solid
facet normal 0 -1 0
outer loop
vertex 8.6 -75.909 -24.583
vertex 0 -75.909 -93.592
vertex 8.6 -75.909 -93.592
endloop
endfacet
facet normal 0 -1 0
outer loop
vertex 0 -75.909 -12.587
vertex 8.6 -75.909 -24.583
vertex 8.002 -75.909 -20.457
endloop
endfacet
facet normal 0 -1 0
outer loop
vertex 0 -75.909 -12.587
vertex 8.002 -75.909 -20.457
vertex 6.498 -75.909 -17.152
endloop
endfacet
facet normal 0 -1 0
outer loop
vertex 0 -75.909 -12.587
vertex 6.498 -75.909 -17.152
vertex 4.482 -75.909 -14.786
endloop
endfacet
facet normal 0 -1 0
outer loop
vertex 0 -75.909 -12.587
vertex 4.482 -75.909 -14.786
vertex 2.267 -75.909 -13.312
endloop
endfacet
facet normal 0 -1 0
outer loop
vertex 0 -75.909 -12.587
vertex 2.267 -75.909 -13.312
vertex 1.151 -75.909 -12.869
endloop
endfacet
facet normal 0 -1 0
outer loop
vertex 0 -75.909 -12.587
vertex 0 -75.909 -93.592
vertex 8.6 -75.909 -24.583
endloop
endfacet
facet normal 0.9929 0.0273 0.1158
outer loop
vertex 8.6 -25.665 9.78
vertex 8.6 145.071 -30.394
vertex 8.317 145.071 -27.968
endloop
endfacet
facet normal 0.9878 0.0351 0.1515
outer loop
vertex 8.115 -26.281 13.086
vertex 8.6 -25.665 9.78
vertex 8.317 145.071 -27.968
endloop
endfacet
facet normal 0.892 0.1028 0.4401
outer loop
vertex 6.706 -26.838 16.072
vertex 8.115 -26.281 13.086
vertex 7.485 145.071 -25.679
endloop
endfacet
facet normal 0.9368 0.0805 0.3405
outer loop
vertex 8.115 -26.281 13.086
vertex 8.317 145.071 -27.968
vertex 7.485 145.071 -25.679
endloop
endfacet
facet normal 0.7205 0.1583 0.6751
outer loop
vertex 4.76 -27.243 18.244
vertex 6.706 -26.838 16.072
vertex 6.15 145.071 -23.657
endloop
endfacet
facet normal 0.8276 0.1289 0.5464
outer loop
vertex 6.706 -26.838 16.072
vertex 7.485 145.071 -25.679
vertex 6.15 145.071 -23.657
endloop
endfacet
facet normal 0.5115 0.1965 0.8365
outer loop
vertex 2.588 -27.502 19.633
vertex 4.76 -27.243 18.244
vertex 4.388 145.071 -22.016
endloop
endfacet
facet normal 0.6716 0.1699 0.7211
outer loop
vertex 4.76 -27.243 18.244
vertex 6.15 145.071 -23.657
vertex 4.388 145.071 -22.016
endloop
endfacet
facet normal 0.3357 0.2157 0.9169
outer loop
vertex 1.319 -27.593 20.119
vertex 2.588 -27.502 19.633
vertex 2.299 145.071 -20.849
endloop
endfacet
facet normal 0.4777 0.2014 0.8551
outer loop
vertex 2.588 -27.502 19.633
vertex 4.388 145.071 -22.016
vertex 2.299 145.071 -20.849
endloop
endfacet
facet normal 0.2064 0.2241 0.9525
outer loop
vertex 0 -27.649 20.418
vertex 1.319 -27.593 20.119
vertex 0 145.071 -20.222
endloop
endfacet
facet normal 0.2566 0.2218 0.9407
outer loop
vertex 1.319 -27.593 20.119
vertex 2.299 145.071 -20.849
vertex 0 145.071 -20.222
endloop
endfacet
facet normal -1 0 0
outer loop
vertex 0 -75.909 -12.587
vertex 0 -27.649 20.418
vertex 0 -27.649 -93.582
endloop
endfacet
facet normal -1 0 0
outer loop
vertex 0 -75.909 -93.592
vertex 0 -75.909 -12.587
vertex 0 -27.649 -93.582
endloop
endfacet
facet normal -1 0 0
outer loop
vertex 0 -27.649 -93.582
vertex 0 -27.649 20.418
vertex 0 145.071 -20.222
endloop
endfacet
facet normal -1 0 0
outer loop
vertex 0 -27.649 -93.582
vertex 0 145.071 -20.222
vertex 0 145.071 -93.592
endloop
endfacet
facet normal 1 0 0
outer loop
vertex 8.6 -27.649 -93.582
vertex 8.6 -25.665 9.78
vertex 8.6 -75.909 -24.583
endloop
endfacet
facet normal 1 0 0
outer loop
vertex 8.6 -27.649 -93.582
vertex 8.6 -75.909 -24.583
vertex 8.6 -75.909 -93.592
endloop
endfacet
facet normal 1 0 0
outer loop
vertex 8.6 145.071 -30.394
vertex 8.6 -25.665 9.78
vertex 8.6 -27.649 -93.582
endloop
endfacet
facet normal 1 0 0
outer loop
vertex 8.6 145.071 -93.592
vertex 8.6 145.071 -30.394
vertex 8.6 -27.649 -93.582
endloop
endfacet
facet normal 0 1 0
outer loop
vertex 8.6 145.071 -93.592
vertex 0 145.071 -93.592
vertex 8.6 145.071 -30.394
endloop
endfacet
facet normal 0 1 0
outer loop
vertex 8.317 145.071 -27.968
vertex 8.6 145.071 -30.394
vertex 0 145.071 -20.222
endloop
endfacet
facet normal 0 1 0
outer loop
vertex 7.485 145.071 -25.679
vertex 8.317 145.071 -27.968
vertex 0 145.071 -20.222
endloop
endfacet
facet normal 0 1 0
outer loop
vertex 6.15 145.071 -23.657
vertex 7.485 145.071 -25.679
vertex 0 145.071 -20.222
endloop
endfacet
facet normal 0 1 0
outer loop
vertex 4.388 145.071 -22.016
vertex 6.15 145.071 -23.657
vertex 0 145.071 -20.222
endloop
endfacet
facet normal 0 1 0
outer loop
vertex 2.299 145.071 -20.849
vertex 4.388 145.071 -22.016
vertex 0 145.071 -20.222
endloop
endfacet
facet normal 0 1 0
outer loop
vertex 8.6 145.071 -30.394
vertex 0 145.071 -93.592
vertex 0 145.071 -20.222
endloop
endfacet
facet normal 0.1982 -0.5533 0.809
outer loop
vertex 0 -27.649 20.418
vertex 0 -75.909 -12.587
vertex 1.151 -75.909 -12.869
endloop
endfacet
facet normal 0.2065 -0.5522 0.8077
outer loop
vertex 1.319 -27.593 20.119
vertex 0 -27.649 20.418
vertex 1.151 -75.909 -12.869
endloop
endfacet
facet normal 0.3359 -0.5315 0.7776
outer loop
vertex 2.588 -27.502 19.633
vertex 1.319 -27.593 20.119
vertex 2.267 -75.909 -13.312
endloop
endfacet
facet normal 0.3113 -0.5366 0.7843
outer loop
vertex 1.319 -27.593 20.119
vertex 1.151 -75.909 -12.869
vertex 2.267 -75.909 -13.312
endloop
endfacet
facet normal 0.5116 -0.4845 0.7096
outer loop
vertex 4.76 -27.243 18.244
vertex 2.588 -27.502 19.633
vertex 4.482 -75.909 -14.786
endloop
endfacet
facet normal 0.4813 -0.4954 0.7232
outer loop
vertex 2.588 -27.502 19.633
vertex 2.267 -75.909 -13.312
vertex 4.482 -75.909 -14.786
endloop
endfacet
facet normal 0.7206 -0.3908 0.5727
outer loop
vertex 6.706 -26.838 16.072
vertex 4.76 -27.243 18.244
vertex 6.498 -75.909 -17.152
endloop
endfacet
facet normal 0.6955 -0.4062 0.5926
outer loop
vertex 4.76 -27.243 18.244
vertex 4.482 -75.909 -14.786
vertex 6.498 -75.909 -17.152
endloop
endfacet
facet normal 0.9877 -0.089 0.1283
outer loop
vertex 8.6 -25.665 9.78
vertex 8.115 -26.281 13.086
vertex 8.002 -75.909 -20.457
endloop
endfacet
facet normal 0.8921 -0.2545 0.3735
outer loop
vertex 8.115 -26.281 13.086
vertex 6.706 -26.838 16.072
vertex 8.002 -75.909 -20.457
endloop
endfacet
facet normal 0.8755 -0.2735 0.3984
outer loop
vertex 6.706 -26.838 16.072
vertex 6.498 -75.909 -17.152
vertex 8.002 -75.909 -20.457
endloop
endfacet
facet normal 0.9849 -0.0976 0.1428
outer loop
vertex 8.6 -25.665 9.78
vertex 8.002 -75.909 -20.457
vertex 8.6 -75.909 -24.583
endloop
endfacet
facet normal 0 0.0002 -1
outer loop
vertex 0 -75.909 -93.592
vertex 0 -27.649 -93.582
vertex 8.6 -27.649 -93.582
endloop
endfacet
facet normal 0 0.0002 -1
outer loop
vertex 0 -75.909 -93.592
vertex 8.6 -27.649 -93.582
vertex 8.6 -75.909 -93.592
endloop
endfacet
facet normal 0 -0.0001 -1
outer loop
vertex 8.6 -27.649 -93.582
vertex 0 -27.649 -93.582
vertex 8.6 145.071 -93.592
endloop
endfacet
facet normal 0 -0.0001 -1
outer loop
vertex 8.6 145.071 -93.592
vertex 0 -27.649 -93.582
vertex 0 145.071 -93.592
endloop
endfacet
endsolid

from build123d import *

# Parameters (mm, degrees)
BOSS_EXTRUDE1_DEPTH = 8.6
FILLET1_R           = 10


with BuildPart() as part:
    # Sketch1 → Boss-Extrude1 (new body)
    with BuildSketch(Plane(origin=(0, 0, 0), x_dir=(0, 0, -1), z_dir=(1, 0, 0))):
        Polygon((-20.418398158, -27.648727352), (93.581601842, -27.648727352), (93.592230689, 145.071272648), (20.221601872, 145.071272648), align=None)
        Polygon((93.581601842, -27.648727352), (93.592230689, -75.908727352), (12.587404818, -75.908727352), (-20.418398158, -27.648727352), align=None)
    extrude(amount=BOSS_EXTRUDE1_DEPTH)

    # Fillet1
    # the kernel refuses this fillet: 10 mm, written as the material it takes off along each edge
    with BuildSketch(Plane(origin=(8.6, -96.341008807, -26.561376141), x_dir=(0, 0.5645185114814042, -0.825420408152609), z_dir=(0, 0.825420408152609, 0.5645185114814043))) as fillet1_piece_1:
        with BuildLine():
            CenterArc((9.901515036, 10), FILLET1_R, 188.047846247, 81.952153753)
            Line((0, 8.6), (-0.198030301, 8.572))
            ThreePointArc((-0.198030301, 8.572), (-0.2, 4.3), (-0.2, 0))
            Line((-0.2, 0), (0, -0.2))
            Line((0, -0.2), (9.901515036, -0.2))
            Line((9.901515036, -0.2), (9.901515036, 0))
        make_face()
    extrude(amount=107.974750842, mode=Mode.SUBTRACT)
    with BuildSketch(Plane(origin=(8.6, 169.167034468, -25.891192892), x_dir=(0, -0.22903933388604258, -0.9734171682958124), z_dir=(0, -0.9734171682958125, 0.22903933388604258))) as fillet1_piece_2:
        with BuildLine():
            CenterArc((9.901515036, -10), FILLET1_R, 90, 81.952153753)
            Line((0, -8.6), (-0.198030301, -8.572))
            ThreePointArc((-0.198030301, -8.572), (-0.2, -4.3), (-0.2, 0))
            Line((-0.2, 0), (0, 0.2))
            Line((0, 0.2), (9.901515036, 0.2))
            Line((9.901515036, 0.2), (9.901515036, 0))
        make_face()
    extrude(amount=226.944347022, mode=Mode.SUBTRACT)


solid = part.part
